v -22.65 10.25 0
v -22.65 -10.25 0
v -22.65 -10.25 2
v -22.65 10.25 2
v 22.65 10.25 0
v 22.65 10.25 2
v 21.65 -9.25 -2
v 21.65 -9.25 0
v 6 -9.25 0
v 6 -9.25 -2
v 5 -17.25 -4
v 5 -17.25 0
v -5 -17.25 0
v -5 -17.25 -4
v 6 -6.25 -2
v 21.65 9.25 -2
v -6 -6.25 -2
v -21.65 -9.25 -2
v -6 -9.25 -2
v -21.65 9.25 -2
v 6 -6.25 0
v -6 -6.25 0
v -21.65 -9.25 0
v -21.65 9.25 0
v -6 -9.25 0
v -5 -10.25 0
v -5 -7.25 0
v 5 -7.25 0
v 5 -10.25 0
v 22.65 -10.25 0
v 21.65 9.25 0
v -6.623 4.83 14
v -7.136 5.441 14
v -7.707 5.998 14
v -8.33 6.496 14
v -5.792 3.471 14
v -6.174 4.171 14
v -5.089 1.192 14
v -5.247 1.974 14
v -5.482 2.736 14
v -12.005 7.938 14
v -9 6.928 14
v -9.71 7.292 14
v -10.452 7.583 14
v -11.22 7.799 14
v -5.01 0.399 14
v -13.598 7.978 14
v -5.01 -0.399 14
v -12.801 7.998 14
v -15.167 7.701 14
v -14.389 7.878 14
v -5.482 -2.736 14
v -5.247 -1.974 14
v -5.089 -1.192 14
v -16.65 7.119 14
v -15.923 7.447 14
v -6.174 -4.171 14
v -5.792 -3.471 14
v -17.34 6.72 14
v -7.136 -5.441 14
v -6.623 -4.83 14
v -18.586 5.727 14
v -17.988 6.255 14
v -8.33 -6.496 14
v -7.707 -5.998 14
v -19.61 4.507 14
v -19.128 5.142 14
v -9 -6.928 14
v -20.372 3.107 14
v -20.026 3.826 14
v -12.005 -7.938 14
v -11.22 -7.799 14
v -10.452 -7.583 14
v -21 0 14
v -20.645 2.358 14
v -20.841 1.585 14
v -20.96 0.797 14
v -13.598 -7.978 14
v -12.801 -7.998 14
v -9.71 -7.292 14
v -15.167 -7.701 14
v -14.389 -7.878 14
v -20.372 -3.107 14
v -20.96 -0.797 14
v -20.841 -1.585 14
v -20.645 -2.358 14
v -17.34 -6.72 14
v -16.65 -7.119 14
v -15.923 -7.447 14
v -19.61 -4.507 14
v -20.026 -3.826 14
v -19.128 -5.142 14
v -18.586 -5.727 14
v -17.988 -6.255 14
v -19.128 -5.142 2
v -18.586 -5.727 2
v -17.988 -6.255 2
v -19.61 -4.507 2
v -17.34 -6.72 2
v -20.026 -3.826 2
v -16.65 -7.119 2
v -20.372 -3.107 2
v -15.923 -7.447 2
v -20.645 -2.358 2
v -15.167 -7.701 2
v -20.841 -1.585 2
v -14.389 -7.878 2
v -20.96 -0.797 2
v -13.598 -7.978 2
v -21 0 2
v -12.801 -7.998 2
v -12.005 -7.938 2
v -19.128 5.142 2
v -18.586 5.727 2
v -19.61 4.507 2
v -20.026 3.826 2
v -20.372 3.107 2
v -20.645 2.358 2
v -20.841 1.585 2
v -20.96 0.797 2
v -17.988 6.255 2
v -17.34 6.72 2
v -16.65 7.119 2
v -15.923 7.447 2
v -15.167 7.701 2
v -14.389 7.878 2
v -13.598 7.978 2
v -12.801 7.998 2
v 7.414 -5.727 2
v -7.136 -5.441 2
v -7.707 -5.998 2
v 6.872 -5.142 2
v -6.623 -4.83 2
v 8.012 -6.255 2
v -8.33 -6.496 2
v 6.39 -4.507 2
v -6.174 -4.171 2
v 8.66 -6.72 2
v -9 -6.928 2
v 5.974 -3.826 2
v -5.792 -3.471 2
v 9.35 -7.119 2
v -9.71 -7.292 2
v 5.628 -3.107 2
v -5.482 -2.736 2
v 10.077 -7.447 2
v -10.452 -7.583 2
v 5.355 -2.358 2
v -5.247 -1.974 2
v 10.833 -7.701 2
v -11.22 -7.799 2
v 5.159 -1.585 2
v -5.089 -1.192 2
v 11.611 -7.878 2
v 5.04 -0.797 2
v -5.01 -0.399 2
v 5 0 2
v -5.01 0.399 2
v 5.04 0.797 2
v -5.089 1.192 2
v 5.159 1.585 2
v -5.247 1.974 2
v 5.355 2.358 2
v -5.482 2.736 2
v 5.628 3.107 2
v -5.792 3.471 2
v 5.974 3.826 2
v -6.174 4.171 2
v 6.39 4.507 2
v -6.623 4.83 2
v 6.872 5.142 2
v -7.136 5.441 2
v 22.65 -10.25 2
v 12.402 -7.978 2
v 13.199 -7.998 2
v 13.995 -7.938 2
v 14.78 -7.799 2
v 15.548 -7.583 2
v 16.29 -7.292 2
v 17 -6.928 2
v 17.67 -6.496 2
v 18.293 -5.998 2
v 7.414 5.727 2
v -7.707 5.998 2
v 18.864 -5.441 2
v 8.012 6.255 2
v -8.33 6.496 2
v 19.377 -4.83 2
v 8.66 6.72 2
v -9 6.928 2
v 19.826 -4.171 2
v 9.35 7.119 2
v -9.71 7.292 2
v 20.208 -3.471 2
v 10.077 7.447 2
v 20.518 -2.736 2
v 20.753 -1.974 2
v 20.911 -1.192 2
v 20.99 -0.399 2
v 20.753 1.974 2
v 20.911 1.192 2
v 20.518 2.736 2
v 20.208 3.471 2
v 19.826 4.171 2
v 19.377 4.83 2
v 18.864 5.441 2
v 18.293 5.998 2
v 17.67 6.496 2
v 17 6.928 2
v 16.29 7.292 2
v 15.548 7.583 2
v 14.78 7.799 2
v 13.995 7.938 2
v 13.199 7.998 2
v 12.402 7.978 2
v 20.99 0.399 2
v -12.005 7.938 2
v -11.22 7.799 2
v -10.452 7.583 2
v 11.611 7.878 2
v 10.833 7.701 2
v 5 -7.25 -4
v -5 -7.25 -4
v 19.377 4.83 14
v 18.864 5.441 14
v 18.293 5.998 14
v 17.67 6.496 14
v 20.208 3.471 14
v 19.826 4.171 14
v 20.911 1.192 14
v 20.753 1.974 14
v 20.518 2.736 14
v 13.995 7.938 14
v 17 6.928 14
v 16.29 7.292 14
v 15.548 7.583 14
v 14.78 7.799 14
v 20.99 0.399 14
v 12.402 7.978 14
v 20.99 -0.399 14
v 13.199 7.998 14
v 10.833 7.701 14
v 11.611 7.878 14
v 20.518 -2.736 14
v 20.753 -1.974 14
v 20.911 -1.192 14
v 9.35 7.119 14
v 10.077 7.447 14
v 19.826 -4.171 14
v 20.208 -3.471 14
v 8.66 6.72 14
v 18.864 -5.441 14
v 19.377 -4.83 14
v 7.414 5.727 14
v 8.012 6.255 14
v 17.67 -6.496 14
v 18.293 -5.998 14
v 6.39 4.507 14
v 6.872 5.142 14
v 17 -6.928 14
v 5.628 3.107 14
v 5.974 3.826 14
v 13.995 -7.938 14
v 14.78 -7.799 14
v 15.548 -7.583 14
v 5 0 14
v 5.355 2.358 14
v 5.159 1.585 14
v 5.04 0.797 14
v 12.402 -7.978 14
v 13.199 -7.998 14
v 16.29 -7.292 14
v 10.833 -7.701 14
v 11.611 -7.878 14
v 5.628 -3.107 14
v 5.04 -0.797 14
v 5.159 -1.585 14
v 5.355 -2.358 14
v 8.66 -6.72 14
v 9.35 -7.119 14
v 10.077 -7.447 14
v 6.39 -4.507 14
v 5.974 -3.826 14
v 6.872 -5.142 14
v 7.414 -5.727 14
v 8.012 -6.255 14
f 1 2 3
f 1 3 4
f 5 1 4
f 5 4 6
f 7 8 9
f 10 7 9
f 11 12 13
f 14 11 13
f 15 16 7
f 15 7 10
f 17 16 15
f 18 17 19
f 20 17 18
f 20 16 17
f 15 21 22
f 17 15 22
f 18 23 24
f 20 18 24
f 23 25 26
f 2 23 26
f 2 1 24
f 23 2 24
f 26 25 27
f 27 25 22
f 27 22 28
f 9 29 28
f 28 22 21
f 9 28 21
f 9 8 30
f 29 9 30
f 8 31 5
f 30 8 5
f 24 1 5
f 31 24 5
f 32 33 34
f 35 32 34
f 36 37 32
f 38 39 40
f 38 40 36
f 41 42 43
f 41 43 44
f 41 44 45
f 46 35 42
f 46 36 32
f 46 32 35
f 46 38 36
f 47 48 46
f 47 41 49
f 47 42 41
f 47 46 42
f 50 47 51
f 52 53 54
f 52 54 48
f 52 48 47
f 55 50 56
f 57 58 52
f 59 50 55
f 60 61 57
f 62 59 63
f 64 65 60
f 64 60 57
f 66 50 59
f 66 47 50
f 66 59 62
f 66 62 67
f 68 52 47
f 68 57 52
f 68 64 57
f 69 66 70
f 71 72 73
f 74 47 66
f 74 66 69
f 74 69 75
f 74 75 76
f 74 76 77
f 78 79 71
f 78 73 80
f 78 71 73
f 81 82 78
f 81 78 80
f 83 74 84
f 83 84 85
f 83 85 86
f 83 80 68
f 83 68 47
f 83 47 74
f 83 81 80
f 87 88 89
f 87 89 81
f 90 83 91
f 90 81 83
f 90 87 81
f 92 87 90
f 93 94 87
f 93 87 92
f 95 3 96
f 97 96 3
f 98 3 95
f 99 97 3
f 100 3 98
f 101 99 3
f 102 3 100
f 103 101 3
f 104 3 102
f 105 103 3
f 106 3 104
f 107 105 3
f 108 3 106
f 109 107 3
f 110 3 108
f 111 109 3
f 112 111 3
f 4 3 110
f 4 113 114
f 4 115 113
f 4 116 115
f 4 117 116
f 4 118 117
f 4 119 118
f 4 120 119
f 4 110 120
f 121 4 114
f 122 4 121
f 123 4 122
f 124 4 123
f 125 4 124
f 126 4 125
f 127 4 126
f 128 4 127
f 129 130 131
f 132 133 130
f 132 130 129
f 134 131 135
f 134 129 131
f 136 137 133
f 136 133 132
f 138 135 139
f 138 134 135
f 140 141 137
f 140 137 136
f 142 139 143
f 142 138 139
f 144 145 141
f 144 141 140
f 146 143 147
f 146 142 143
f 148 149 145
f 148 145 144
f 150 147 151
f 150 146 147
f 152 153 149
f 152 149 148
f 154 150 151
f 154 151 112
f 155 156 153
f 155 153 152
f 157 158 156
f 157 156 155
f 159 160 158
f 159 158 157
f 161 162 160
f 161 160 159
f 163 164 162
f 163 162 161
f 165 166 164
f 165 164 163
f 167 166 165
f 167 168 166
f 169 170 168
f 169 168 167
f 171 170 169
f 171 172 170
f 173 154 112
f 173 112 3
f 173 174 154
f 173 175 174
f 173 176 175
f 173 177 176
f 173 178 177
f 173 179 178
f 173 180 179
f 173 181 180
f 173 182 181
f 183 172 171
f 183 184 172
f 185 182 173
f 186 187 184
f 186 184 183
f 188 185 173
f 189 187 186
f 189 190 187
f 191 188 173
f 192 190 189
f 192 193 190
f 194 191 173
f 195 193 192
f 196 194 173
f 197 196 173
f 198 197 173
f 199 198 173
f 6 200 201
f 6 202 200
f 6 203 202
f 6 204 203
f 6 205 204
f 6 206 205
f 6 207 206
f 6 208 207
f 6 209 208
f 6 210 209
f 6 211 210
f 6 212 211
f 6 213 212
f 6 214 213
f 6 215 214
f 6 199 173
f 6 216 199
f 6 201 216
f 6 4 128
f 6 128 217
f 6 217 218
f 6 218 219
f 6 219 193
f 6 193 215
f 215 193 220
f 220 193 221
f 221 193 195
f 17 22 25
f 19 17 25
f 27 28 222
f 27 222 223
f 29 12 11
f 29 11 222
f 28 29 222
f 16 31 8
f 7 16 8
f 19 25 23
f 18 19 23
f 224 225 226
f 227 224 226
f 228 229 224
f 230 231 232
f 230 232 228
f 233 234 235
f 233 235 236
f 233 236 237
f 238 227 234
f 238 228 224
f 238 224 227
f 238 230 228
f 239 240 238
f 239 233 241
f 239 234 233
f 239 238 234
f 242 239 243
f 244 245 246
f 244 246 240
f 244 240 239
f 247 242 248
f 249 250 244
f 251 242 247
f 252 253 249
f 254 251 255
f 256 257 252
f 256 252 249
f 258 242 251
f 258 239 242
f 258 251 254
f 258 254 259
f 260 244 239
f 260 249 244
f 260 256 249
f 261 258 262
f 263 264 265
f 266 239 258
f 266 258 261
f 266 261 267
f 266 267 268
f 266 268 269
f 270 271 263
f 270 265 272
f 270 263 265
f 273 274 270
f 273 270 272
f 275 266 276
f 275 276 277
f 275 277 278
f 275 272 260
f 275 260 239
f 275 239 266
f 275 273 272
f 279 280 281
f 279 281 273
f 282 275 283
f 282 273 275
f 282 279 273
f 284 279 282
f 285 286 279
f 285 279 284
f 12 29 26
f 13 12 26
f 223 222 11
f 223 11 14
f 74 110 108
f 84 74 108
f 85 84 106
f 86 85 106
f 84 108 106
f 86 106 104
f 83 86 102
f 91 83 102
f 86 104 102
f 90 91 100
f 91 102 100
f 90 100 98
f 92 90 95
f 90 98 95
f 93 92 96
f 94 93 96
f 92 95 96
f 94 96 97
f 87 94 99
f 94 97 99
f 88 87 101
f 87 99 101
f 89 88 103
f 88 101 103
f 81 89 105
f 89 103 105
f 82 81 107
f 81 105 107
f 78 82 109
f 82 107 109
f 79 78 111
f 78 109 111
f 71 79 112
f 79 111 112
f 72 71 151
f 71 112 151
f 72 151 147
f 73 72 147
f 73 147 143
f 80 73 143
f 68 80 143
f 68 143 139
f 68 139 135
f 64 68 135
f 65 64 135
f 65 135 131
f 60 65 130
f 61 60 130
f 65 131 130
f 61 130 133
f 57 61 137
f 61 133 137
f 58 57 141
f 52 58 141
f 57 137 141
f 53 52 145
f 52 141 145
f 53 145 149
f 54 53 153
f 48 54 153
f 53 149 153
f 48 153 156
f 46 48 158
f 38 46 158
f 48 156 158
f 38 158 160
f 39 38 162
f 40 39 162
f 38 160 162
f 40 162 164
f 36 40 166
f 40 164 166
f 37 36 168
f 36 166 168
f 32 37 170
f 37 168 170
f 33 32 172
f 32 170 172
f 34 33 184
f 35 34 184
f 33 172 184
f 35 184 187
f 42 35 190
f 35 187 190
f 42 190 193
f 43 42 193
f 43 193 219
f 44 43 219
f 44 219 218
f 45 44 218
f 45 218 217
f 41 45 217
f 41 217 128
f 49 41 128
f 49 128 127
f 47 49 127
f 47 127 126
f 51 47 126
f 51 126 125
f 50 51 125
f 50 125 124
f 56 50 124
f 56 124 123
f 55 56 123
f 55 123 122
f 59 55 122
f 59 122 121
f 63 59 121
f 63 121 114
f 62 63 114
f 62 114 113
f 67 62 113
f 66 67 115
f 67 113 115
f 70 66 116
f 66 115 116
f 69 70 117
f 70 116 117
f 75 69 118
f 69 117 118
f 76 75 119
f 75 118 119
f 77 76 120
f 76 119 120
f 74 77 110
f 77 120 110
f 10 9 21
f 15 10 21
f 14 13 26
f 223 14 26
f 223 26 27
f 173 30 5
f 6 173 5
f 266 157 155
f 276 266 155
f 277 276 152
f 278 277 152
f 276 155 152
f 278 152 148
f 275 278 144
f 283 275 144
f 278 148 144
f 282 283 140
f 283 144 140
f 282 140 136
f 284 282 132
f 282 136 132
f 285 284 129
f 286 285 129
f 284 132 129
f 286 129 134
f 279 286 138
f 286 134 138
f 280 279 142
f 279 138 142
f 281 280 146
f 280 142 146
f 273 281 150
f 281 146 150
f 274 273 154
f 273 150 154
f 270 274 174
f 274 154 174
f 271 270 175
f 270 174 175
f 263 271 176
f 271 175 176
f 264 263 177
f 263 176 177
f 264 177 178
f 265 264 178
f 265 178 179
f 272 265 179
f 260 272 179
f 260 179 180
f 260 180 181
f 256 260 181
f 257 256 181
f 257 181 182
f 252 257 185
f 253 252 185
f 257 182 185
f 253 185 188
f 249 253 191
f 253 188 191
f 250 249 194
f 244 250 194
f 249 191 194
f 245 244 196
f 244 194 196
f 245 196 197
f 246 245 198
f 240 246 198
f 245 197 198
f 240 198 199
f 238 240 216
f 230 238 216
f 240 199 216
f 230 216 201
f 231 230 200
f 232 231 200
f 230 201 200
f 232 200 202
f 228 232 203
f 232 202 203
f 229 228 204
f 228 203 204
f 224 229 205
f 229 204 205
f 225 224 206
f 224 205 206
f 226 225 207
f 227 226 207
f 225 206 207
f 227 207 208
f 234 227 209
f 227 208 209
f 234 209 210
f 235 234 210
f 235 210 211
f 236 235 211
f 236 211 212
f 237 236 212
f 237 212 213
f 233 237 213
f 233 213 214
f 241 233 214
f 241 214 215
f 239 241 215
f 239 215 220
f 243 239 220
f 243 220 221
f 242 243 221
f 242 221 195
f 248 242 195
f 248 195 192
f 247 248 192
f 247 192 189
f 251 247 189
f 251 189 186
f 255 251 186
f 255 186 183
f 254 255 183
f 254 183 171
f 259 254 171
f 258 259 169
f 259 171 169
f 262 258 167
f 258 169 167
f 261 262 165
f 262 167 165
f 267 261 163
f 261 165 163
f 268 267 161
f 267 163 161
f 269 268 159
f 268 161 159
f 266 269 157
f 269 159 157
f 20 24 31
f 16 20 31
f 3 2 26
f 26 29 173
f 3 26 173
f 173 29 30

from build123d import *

# Parameters (mm, degrees)
SKETCH1_W           = 45.3
SKETCH1_H           = 20.5
BOSS_EXTRUDE1_DEPTH = 2
SKETCH2_W           = 10
SKETCH2_H           = 10
BOSS_EXTRUDE2_DEPTH = 4
SKETCH3_R           = 8
BOSS_EXTRUDE3_DEPTH = 12
BOSS_EXTRUDE4_DEPTH = 2


with BuildPart() as part:
    # Sketch1 → Boss-Extrude1 (new body)
    with BuildSketch(Plane.XY):
        Rectangle(SKETCH1_W, SKETCH1_H)
    extrude(amount=BOSS_EXTRUDE1_DEPTH)

    # Sketch2 → Boss-Extrude2 (add)
    with BuildSketch(Plane(origin=(0, 0, 0), x_dir=(-1, 0, 0), z_dir=(0, 0, -1))):
        with Locations((0, -12.25)):
            Rectangle(SKETCH2_W, SKETCH2_H)
    extrude(amount=BOSS_EXTRUDE2_DEPTH)

    # Sketch3 → Boss-Extrude3 (add)
    with BuildSketch(Plane.XY.offset(2)):
        with Locations(Location((13, 0, 0), (0, 0, 180))):
            Circle(SKETCH3_R)
        with Locations(Location((-13, 0, 0), (0, 0, 180))):
            Circle(SKETCH3_R)
    extrude(amount=BOSS_EXTRUDE3_DEPTH)

    # Sketch4 → Boss-Extrude4 (add)
    with BuildSketch(Plane(origin=(0, 0, 0), x_dir=(-1, 0, 0), z_dir=(0, 0, -1))):
        Polygon((-6, -9.25), (-6, -6.25), (6, -6.25), (6, -9.25), (21.65, -9.25), (21.65, 9.25), (-21.65, 9.25), (-21.65, -9.25), align=None)
    extrude(amount=BOSS_EXTRUDE4_DEPTH)


solid = part.part
